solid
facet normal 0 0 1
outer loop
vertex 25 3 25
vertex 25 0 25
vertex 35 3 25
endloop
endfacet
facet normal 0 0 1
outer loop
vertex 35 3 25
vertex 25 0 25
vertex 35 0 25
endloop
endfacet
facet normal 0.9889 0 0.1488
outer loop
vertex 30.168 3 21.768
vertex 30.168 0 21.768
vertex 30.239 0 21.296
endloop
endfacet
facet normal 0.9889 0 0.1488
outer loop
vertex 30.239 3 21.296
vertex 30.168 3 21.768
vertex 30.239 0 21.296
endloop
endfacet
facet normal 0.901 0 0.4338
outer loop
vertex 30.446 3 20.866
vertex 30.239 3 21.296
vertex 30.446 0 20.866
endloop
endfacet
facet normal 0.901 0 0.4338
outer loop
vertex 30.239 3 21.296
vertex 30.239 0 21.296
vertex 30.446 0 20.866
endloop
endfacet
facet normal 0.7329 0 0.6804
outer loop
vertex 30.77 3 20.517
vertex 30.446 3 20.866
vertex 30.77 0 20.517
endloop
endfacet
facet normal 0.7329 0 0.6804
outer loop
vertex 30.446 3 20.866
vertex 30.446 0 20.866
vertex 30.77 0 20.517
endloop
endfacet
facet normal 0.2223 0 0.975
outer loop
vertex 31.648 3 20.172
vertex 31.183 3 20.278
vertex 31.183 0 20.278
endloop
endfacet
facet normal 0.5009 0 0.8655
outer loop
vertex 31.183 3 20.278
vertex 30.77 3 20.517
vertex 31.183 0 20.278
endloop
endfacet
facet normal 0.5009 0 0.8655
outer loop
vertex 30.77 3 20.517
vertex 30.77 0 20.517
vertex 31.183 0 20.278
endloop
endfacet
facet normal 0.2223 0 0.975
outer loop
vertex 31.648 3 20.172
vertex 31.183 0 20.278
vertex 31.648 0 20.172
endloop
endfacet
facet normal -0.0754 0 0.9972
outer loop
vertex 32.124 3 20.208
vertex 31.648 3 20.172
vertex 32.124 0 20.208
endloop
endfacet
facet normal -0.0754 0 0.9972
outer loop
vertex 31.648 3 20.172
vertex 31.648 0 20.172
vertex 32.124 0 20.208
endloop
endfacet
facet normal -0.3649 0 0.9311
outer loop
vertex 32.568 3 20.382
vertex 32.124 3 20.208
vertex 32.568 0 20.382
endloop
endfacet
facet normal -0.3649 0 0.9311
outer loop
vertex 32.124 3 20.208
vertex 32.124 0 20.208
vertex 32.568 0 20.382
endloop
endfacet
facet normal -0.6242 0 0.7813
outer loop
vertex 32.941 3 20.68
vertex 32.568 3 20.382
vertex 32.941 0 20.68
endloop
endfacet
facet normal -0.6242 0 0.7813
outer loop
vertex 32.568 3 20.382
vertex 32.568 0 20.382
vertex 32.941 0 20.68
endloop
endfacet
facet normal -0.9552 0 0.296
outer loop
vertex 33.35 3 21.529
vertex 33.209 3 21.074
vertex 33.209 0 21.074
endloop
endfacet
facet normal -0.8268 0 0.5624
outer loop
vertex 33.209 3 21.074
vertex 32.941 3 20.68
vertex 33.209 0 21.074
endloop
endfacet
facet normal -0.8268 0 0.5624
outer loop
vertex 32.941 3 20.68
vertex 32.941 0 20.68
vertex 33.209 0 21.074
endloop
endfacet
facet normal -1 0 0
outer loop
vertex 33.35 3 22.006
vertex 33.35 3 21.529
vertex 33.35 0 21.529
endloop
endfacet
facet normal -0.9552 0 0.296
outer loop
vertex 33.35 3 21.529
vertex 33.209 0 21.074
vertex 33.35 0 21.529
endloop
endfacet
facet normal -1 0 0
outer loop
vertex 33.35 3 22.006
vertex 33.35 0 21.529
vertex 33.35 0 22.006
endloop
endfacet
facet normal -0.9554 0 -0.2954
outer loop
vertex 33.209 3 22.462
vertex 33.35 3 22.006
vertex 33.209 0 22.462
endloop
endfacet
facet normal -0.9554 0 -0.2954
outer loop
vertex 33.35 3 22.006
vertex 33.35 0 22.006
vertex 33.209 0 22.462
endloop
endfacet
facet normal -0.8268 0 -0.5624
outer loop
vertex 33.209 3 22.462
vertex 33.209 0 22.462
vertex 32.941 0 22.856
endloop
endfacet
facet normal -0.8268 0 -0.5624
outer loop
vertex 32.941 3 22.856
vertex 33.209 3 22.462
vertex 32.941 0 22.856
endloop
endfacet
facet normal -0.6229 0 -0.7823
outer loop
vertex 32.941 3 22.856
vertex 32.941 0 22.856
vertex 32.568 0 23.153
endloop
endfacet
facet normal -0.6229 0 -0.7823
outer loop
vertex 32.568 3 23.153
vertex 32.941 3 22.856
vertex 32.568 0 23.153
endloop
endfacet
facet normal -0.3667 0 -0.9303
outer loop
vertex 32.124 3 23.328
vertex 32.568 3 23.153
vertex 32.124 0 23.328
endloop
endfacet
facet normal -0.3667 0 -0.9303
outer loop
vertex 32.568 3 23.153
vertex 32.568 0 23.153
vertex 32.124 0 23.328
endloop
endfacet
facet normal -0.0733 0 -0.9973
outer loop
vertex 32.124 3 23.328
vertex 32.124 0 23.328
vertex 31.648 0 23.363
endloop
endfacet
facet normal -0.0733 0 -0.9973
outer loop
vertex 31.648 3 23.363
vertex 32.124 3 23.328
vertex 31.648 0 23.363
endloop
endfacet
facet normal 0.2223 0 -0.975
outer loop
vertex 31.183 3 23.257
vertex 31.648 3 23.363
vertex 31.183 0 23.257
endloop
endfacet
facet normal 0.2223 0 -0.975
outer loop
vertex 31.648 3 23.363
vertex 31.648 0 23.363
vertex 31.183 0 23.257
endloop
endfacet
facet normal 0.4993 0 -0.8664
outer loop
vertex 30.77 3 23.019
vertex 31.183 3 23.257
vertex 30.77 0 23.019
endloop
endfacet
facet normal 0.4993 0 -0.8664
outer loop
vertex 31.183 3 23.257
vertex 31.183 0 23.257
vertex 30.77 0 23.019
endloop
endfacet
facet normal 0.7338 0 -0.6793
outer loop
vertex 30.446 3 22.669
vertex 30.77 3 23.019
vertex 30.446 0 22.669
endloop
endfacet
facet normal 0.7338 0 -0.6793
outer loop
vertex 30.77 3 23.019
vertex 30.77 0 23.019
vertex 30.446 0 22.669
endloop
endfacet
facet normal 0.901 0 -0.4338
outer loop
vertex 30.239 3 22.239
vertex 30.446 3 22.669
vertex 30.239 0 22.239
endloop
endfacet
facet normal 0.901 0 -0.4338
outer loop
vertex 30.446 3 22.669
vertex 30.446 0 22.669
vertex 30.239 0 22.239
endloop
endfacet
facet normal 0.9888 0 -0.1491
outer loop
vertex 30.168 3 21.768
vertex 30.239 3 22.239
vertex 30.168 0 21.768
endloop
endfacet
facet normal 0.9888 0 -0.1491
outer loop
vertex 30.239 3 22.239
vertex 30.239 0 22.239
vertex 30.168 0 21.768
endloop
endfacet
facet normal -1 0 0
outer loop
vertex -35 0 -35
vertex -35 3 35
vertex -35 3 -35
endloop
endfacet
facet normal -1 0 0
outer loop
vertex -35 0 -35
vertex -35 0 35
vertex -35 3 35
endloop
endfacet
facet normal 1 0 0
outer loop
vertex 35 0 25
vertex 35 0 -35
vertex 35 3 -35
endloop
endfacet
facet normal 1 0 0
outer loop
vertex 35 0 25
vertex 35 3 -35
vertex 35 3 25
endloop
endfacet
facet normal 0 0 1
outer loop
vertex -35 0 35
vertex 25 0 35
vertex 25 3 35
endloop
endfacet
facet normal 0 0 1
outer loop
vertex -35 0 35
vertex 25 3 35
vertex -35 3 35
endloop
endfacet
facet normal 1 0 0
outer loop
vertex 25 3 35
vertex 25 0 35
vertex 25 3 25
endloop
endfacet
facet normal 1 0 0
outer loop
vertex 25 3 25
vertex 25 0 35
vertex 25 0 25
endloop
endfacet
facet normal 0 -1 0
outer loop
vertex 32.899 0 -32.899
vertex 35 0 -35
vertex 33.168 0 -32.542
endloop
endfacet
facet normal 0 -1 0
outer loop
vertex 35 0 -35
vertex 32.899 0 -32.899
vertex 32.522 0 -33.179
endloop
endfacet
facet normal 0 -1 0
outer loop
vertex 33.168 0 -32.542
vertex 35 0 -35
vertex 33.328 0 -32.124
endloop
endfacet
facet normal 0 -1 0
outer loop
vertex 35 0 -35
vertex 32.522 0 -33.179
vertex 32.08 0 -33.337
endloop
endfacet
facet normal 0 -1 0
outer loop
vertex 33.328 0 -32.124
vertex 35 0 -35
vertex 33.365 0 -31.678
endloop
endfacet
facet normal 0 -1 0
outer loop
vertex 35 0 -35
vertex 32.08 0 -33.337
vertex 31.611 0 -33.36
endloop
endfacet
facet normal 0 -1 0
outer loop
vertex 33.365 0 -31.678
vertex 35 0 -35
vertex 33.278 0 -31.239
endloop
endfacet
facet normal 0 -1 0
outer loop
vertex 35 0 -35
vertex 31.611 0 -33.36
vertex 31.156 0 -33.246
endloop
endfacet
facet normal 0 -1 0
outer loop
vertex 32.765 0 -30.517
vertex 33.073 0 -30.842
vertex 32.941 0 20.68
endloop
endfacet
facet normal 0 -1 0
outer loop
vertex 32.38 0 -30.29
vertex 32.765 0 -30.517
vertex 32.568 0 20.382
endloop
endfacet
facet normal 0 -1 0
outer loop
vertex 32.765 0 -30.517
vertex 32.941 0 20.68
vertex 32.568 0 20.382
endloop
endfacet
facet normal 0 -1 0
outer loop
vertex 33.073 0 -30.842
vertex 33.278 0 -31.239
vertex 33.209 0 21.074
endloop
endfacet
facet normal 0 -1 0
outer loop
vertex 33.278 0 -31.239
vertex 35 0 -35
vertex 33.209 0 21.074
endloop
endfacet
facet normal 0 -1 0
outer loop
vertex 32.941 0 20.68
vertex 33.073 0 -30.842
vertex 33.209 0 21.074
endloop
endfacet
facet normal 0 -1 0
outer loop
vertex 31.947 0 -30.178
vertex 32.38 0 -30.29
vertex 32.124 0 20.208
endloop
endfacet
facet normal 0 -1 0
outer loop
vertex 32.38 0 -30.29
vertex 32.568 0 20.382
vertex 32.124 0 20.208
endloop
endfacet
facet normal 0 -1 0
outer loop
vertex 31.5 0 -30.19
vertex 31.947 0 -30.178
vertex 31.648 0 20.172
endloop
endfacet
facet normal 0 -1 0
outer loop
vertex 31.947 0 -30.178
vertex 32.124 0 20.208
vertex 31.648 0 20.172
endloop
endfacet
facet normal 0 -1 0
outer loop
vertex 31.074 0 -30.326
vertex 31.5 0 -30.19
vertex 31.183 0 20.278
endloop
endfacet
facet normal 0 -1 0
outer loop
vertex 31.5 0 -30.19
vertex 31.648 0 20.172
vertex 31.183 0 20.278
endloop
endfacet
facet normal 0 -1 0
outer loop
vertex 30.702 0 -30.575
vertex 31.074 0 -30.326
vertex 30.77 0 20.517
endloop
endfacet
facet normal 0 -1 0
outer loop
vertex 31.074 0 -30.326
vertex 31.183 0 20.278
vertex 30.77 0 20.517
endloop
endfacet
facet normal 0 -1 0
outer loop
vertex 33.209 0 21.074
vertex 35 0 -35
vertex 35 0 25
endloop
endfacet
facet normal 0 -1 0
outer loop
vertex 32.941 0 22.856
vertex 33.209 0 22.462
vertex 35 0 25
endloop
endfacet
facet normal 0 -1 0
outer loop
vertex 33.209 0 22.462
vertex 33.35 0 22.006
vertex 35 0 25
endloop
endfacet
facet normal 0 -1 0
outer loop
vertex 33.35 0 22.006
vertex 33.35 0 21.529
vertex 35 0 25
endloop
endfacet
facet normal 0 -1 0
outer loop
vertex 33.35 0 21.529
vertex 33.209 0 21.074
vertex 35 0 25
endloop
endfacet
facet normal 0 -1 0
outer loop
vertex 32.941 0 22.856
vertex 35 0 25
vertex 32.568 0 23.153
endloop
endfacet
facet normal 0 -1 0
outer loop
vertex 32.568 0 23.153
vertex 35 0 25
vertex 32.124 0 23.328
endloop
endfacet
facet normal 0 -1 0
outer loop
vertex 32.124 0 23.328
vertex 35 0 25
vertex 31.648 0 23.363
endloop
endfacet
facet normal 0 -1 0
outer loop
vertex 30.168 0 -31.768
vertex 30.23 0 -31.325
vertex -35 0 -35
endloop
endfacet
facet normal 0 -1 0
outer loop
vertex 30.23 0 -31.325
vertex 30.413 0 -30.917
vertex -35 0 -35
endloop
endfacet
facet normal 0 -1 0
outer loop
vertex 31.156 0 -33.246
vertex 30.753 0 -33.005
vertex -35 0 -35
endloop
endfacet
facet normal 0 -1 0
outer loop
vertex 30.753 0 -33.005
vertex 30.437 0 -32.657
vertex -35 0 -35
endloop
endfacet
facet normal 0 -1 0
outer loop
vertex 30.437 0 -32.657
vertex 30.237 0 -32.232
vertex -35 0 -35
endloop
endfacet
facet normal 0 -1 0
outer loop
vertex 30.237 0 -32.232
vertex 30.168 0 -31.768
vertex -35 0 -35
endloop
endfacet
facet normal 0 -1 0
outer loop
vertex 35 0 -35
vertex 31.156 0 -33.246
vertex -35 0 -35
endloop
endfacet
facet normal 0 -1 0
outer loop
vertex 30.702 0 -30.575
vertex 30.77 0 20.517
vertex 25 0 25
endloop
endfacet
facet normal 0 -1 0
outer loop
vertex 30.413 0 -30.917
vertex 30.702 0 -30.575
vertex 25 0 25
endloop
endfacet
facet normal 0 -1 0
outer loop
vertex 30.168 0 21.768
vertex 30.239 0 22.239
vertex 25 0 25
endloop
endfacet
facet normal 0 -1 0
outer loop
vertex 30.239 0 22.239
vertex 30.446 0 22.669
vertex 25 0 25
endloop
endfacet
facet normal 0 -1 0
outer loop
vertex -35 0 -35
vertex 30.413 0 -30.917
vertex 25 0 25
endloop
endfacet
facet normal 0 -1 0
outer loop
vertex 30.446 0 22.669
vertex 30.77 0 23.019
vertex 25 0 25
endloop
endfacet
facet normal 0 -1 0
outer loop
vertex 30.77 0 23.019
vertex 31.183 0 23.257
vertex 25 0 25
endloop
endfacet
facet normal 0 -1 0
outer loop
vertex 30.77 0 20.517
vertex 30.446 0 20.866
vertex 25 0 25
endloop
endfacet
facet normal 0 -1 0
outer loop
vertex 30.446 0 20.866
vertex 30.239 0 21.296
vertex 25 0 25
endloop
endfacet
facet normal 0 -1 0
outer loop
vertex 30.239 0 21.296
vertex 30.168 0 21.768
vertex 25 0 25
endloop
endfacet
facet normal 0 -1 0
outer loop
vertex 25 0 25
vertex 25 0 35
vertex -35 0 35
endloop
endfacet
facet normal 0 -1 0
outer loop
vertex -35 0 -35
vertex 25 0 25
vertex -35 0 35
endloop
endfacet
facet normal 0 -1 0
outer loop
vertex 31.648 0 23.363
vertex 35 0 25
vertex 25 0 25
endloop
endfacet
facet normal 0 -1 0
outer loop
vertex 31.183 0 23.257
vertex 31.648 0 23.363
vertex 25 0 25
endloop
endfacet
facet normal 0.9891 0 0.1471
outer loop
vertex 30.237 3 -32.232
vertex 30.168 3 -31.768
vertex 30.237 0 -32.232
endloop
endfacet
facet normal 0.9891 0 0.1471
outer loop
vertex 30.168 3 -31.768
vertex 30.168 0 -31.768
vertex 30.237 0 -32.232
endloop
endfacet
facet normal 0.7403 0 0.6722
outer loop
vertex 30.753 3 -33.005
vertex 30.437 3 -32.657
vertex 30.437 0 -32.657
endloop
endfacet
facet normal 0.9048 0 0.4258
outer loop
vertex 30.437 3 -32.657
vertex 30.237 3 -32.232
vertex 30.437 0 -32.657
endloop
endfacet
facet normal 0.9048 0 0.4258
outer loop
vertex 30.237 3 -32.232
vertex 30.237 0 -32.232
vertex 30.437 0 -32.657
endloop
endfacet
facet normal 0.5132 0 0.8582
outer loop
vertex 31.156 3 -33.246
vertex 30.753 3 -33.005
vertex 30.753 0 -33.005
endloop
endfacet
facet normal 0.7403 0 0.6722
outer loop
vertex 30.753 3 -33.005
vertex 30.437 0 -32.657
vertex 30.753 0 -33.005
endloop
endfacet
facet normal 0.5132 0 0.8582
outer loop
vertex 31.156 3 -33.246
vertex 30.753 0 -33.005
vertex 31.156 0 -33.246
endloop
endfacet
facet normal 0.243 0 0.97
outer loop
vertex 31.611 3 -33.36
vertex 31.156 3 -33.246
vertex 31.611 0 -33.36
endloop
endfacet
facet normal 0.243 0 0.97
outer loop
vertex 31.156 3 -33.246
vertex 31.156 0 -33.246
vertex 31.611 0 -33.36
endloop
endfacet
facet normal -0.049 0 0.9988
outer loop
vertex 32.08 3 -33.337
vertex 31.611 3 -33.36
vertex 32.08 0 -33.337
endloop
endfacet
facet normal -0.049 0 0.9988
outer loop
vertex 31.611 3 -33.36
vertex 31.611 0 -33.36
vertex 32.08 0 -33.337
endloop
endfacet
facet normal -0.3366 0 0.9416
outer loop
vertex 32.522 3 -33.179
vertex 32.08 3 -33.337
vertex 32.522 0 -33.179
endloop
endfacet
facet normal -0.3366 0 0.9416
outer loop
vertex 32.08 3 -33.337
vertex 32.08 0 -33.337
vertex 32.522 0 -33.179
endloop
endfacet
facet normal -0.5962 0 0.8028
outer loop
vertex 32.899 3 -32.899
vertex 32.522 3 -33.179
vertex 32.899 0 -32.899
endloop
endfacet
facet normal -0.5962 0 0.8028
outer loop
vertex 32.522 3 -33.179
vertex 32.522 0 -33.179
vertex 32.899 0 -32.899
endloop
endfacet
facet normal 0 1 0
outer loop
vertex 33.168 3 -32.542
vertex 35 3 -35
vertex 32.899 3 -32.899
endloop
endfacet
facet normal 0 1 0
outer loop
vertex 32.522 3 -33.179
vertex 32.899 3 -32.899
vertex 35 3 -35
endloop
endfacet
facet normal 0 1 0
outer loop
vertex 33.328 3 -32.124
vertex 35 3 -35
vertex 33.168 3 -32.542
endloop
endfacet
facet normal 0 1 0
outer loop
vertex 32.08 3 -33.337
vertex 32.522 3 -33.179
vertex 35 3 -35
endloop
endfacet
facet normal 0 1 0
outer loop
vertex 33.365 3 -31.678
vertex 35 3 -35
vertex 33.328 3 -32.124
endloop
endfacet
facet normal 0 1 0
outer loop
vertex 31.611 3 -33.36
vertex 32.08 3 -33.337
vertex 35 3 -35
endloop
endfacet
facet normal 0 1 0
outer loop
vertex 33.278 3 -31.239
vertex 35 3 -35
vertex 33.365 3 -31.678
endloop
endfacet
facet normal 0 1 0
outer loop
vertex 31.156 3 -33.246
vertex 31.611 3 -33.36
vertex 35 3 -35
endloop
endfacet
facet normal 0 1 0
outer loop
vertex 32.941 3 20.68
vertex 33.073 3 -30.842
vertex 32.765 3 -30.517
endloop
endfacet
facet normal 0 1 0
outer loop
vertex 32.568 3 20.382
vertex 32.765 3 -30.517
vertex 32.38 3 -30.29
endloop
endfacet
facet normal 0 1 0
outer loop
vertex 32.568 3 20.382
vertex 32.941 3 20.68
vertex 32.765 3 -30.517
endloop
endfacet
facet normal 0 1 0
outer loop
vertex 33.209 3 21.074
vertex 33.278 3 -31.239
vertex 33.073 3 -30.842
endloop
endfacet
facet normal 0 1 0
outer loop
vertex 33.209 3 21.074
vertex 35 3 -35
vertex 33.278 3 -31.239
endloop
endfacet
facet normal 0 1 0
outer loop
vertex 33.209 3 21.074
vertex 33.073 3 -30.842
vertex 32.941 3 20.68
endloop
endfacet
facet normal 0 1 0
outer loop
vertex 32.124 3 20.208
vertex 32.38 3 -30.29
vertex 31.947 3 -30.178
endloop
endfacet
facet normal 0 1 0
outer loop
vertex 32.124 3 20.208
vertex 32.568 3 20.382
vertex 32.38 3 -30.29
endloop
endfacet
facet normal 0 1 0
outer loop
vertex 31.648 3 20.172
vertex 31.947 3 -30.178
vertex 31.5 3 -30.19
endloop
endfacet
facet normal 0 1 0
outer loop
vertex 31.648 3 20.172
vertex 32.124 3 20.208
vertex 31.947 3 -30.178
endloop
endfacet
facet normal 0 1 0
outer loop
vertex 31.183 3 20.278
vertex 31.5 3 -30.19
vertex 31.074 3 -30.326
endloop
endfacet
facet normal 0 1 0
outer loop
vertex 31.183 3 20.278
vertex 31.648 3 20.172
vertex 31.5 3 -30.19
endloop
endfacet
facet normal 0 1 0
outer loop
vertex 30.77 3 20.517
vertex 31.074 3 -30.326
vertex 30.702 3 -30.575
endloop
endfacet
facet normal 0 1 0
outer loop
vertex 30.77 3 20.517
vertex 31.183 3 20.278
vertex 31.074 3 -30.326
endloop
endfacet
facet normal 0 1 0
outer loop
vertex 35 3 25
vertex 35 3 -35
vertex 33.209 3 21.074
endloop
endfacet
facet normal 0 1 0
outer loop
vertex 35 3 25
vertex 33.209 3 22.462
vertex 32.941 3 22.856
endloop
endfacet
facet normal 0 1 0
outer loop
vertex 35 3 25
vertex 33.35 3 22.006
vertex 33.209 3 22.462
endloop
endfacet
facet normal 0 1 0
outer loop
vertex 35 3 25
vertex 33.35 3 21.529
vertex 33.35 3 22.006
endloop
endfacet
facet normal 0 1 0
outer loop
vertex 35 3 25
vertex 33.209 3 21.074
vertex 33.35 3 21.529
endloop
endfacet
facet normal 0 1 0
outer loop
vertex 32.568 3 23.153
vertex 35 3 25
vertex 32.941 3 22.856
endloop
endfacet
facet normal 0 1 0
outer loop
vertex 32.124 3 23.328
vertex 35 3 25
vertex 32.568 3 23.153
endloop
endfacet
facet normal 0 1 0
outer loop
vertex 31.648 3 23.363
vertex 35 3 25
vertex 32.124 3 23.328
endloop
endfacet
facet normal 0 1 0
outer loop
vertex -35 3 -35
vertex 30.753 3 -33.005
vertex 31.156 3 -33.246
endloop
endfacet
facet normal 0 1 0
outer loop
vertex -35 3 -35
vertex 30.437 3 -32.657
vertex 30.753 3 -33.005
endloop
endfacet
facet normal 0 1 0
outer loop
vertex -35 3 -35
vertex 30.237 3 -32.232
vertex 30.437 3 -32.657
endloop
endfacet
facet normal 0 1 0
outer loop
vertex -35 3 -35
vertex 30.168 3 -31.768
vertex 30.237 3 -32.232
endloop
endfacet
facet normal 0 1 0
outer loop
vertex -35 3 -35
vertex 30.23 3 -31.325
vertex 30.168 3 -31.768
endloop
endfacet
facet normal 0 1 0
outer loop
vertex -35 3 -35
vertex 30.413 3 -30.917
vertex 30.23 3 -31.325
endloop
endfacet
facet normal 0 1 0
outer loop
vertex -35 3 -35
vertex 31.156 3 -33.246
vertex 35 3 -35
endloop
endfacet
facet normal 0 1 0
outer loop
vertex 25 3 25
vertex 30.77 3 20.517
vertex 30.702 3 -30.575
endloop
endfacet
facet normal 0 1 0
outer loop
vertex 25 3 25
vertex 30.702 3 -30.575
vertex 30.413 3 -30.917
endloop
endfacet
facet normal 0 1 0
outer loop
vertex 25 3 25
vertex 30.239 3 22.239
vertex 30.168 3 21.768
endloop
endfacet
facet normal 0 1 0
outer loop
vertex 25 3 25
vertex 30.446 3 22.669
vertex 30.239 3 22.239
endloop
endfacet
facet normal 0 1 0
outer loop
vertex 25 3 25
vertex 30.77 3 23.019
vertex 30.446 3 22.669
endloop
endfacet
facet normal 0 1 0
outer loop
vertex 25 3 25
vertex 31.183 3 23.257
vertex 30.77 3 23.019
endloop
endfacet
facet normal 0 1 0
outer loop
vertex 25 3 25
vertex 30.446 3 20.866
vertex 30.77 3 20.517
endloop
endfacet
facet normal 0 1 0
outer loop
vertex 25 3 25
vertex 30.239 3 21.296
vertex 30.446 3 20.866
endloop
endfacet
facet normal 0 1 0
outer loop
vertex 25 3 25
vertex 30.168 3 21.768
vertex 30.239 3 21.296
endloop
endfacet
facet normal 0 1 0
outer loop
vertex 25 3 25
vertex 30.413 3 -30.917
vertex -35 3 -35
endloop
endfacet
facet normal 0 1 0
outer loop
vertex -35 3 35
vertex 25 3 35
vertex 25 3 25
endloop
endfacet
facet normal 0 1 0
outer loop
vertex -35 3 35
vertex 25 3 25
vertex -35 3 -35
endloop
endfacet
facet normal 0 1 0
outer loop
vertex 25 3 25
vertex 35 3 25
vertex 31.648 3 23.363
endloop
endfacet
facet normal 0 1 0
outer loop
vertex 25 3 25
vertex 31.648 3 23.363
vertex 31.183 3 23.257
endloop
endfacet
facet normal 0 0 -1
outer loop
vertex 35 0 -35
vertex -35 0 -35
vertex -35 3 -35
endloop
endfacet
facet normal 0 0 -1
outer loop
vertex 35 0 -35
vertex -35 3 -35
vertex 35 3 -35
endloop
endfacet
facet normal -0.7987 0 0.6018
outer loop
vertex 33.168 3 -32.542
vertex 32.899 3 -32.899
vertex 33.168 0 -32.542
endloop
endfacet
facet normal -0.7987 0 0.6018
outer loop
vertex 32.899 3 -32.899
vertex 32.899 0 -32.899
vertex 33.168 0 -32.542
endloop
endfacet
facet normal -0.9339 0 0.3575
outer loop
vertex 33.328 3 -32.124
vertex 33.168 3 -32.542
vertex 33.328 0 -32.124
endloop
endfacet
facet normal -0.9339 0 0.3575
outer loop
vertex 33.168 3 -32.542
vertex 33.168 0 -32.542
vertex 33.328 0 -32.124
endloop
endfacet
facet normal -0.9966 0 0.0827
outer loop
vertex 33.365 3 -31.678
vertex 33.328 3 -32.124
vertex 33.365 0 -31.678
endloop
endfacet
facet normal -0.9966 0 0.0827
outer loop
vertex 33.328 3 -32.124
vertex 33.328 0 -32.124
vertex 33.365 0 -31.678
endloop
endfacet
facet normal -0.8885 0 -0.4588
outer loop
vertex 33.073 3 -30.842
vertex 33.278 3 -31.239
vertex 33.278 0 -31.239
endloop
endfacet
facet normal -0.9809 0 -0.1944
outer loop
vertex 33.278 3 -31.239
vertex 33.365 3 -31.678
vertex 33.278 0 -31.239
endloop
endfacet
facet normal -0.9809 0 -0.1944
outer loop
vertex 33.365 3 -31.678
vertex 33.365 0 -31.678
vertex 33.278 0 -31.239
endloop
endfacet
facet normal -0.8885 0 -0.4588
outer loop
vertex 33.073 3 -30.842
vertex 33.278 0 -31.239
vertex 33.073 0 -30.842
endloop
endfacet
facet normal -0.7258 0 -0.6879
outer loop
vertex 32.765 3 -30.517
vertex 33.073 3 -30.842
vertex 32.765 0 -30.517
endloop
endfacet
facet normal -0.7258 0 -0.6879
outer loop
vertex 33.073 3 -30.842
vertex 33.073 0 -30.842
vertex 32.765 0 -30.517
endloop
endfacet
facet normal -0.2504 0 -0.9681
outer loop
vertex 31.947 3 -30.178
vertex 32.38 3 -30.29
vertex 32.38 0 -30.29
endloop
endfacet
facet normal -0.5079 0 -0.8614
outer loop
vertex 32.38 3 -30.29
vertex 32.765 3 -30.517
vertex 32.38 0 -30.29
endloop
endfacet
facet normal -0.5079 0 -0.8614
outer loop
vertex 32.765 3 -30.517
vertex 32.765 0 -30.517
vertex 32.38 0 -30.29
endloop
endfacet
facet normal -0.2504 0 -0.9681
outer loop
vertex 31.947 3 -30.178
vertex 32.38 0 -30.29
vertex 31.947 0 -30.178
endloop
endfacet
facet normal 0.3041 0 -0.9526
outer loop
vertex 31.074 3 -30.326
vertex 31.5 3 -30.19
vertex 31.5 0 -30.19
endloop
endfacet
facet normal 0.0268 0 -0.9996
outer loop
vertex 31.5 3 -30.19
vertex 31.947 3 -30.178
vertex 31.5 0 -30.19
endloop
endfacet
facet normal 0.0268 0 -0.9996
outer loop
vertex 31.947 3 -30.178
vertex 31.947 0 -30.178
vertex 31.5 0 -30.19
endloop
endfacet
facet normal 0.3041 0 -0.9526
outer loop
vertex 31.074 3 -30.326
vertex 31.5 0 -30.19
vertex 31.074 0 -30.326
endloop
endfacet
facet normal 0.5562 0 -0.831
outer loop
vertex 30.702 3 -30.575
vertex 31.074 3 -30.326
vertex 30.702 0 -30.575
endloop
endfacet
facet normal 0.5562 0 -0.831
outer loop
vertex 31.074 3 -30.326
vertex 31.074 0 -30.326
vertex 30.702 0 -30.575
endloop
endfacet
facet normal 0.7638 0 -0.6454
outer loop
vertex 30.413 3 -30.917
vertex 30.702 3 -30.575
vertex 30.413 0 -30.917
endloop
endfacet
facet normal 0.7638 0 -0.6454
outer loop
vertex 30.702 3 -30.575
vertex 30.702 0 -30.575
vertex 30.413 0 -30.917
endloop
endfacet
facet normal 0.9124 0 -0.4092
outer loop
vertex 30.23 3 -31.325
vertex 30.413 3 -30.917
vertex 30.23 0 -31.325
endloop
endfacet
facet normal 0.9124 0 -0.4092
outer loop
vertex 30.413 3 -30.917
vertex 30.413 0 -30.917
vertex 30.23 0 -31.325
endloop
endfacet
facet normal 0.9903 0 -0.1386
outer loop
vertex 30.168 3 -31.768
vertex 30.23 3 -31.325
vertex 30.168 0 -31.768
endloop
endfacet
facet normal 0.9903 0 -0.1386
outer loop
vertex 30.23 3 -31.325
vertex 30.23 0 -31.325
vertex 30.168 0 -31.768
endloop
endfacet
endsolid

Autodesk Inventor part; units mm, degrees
ref_plane "YZ Plane" through (0, 0, 0) normal (1, 0, 0) x (0, 1, 0)
ref_plane "XZ Plane" through (0, 0, 0) normal (0, 1, 0) x (-1, 0, 0)
ref_plane "XY Plane" through (0, 0, 0) normal (0, 0, 1) x (1, 0, 0)
sketch "Эскиз1" plane through (0, 0, 0) normal (0, 1, 0) x (-1, 0, 0)
  line L0 (-35, 35) -> (35, 35)
  line L1 (35, 35) -> (35, -35)
  line L2 (35, -35) -> (-35, -35)
  line L3 (-35, -35) -> (-35, 35)
  line L4 (-35, 35) -> (35, -35) construction
  line L5 (35, 35) -> (-35, -35) construction
  line L6 (-35, 35) -> (-25, 35)
  line L7 (-25, 35) -> (-25, 25)
  line L8 (-25, 25) -> (-35, 25)
  line L9 (-35, 25) -> (-35, 35)
  circle A0 centre (-31.7678, 21.7678) radius 1.6
  line L10 (-35, -35) -> (-31.7678, -31.7678)
  circle A1 centre (-31.7678, -31.7678) radius 1.6
  point P0 (0, 0)
  point P1 (-35, 15)
  dimension "d0" = 70
  dimension "d1" = 70
  dimension "d3" = 10
  dimension "d5" = 3.2
  dimension "d7" = 4.571
  dimension "d8" = 3.2
  dimension "d11" = 4.5711
  dimension "d12" = 10
extrude "Выдавливание1" add sketch "Эскиз1" along normal blind 3 contours L0 L1 L2 L3 L8 L7
properties part number "000.109 - Правая боковая панель заднего сегмента"
